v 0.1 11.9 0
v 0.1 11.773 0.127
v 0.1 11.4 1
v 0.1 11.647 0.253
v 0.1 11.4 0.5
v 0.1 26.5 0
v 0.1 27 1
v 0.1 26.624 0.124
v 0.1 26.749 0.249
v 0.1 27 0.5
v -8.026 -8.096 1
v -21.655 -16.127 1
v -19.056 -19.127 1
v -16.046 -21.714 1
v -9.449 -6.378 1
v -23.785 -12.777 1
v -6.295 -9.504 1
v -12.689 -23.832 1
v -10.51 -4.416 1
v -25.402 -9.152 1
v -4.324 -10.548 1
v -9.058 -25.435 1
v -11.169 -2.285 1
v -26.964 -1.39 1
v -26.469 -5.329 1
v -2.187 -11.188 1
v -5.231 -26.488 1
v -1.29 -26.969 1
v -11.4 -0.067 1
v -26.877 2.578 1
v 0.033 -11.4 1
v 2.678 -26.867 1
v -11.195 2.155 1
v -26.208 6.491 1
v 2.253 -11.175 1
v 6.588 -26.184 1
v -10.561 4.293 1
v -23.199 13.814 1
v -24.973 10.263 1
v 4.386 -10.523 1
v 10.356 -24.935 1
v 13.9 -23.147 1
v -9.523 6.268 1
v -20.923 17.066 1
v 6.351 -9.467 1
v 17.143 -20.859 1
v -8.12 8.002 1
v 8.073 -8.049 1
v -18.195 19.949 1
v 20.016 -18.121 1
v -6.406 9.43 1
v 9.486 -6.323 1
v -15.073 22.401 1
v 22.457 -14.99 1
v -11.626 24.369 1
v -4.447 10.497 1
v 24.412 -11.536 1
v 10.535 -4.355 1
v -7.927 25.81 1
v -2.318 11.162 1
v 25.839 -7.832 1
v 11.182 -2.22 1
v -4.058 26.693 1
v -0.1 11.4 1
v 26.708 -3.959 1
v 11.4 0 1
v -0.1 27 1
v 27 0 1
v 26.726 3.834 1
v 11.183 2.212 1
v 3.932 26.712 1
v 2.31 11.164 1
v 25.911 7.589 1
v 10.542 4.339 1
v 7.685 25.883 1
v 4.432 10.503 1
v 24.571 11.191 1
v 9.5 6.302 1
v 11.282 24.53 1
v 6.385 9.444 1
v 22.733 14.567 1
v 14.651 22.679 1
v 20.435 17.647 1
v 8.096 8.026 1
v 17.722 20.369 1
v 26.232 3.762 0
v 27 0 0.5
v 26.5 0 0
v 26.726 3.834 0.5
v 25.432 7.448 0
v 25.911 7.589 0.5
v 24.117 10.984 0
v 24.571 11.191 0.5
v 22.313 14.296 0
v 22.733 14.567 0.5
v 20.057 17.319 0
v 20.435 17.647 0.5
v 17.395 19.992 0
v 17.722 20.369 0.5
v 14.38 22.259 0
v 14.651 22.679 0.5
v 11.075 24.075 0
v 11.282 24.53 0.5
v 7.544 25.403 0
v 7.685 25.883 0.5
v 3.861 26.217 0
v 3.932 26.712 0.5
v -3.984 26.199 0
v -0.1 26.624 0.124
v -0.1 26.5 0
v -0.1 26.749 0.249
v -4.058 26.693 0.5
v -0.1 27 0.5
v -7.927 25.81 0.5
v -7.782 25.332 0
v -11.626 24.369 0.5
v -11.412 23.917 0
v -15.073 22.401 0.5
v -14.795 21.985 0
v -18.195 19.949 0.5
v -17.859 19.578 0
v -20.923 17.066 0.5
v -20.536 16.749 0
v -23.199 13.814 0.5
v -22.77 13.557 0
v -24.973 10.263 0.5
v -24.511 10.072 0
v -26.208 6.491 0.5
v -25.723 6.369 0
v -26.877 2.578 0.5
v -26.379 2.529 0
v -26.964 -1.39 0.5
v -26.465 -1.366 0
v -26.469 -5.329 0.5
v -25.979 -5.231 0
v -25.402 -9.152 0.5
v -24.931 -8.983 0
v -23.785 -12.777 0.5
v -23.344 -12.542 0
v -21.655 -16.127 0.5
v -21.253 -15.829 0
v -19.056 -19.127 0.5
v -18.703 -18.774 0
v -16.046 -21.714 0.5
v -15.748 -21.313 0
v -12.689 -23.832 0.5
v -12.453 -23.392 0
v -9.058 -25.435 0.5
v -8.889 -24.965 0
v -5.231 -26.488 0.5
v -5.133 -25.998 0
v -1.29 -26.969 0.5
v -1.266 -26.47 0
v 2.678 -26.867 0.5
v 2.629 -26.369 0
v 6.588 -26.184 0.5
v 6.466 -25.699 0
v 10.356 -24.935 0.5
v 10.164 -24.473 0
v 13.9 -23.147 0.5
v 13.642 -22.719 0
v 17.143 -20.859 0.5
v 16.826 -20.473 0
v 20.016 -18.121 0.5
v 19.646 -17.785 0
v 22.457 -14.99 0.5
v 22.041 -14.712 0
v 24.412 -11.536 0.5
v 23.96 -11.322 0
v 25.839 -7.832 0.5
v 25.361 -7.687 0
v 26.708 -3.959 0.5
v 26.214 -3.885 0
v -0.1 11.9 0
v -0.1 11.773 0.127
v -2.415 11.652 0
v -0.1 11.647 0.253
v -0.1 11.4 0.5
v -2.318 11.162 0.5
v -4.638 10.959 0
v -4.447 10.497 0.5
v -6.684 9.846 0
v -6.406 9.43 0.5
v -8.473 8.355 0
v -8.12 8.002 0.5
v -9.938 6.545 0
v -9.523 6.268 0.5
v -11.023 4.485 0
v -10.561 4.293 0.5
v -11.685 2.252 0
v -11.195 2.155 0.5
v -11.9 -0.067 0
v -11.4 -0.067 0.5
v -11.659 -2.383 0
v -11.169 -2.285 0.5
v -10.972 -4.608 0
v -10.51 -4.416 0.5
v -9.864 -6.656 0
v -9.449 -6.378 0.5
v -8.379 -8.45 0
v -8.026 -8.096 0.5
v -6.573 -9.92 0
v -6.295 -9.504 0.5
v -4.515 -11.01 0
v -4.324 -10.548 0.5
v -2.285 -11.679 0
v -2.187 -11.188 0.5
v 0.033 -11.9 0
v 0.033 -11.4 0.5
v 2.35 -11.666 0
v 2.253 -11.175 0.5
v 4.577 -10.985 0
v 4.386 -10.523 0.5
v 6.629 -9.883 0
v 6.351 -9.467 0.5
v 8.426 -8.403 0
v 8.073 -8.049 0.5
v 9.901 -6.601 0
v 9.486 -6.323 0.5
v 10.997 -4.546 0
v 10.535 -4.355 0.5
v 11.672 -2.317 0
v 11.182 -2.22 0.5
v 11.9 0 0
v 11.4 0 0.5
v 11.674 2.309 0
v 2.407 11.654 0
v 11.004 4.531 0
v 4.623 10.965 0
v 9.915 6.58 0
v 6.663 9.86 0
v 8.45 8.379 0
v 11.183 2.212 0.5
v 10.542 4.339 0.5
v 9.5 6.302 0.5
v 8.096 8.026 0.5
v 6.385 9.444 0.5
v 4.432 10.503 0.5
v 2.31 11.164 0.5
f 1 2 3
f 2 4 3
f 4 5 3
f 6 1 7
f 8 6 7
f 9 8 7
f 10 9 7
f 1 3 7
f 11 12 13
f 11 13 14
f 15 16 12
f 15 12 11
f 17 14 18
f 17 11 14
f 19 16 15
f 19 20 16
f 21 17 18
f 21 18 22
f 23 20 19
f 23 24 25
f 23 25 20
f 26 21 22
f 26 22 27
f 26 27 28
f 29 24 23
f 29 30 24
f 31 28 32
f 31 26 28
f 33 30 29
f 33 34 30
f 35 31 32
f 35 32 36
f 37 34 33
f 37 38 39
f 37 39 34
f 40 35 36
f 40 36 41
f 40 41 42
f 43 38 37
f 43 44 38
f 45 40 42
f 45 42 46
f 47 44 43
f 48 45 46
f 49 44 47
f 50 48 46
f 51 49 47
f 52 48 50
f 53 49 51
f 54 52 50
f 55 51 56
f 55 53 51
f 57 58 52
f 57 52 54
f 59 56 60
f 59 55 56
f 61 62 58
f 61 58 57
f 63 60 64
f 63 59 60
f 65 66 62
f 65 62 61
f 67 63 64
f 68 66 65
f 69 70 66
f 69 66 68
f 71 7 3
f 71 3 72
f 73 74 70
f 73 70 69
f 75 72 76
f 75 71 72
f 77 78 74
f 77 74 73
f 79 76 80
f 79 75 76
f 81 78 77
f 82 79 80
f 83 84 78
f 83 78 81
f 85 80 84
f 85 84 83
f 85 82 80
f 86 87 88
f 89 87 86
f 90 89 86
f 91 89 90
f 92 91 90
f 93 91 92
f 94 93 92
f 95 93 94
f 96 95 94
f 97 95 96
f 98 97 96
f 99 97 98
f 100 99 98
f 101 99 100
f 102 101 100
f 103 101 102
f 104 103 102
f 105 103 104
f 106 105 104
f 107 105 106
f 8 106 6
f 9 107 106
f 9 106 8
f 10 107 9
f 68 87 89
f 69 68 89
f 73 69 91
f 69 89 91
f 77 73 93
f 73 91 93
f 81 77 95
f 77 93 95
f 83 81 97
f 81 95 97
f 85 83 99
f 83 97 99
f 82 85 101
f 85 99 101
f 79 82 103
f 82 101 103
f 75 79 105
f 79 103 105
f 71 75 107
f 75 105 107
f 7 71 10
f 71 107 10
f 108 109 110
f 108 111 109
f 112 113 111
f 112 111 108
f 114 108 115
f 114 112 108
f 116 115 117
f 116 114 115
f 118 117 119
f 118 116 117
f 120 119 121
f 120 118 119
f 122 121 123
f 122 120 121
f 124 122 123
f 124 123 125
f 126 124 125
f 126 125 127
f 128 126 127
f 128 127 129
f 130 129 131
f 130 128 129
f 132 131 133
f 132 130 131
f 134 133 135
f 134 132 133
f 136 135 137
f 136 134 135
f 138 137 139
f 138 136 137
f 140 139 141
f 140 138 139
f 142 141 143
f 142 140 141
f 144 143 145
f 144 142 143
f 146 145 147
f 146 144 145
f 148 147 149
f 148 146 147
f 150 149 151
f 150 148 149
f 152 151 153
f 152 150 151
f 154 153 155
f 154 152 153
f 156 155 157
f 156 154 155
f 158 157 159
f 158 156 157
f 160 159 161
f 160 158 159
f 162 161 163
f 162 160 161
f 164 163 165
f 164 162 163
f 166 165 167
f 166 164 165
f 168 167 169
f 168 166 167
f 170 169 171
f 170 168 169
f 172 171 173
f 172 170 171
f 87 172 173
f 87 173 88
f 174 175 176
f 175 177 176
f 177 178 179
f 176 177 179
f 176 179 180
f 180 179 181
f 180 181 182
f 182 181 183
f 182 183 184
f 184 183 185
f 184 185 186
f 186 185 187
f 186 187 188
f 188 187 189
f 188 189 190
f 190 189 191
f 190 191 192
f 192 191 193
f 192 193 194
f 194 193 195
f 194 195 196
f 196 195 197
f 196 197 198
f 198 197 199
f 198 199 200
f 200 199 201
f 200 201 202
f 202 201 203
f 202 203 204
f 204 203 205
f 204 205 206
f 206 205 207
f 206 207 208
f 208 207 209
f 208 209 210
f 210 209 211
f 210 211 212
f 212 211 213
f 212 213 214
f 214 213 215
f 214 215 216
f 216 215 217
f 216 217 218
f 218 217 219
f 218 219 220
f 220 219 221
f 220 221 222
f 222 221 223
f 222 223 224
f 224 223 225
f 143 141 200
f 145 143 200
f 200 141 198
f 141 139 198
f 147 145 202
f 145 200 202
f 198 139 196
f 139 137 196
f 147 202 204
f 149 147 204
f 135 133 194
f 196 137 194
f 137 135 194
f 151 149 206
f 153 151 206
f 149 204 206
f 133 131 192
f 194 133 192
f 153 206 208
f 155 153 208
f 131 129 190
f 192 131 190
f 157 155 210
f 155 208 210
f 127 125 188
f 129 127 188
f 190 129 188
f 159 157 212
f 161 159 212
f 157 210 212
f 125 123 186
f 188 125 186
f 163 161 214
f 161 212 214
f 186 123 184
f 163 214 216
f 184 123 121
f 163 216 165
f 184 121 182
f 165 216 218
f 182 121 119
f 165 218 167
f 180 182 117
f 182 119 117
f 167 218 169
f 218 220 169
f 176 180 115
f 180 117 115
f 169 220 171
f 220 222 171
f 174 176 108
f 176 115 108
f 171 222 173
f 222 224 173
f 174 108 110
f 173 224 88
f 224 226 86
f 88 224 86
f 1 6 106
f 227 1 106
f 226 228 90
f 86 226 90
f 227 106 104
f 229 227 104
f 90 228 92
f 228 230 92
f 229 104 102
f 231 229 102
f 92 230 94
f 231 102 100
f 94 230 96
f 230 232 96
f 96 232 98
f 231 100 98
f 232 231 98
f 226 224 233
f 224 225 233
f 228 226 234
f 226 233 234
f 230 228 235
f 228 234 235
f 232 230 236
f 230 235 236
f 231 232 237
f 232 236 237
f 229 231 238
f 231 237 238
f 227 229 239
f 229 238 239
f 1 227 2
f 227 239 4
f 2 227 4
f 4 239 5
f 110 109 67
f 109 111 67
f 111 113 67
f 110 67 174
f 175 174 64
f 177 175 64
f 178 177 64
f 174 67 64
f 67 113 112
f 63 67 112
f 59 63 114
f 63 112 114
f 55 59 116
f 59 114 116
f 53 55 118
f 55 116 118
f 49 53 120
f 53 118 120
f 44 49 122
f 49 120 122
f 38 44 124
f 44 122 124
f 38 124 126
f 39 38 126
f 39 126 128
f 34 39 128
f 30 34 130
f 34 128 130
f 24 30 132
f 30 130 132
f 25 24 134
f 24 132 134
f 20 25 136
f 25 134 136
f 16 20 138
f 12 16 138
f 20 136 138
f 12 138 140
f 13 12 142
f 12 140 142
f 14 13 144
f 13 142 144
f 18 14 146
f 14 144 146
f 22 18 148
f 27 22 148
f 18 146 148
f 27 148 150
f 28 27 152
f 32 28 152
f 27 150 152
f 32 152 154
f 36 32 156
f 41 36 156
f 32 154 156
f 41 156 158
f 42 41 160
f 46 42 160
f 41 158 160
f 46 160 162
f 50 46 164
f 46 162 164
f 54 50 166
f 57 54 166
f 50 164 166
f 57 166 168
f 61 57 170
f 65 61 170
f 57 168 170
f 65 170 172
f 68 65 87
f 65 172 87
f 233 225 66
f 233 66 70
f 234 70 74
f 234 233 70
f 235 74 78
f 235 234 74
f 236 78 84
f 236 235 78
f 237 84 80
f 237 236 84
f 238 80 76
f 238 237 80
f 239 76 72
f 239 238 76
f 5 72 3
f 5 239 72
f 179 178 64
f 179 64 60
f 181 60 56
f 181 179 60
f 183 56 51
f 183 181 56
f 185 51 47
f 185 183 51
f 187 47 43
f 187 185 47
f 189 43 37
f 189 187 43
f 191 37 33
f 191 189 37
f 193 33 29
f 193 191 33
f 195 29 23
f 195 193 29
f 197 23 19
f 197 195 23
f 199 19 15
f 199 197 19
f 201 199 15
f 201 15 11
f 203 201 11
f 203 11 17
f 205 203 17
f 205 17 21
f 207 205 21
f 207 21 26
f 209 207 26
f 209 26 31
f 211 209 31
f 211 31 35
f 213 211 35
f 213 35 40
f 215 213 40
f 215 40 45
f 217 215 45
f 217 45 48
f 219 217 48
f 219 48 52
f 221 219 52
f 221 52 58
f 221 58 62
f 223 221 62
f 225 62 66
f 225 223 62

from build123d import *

# Parameters (mm, degrees)
F0_R     = 27
F0_R_2   = 11.4
F1_DEPTH = 1
F3_DEPTH = 1
F4_SIZE  = 0.5


with BuildPart() as f1:
    # F0 (on Top) → F1 (new body)
    with BuildSketch(Plane.XY):
        Circle(F0_R)
        Circle(F0_R_2, mode=Mode.SUBTRACT)
    extrude(amount=F1_DEPTH)

    # F2 (on face) → F3 (cut, through all)
    with BuildSketch(Plane.XY.offset(1)):
        with BuildLine():
            ThreePointArc((0.1, 26.999815), (0, 27), (-0.1, 26.999815))
            Line((-0.1, 26.999815), (-0.1, 11.399561))
            Line((-0.1, 11.399561), (0.1, 11.399561))
            Line((0.1, 11.399561), (0.1, 26.999815))
        make_face()
    extrude(amount=-F3_DEPTH, mode=Mode.SUBTRACT)

    # F4
    f4_edges = [f1.edges().sort_by_distance(p)[0] for p in [
        (-19.056495, -19.127206, 0),
        (-8.025584, -8.096295, 0),
    ]]
    chamfer(f4_edges, length=F4_SIZE)


solid = f1.part
